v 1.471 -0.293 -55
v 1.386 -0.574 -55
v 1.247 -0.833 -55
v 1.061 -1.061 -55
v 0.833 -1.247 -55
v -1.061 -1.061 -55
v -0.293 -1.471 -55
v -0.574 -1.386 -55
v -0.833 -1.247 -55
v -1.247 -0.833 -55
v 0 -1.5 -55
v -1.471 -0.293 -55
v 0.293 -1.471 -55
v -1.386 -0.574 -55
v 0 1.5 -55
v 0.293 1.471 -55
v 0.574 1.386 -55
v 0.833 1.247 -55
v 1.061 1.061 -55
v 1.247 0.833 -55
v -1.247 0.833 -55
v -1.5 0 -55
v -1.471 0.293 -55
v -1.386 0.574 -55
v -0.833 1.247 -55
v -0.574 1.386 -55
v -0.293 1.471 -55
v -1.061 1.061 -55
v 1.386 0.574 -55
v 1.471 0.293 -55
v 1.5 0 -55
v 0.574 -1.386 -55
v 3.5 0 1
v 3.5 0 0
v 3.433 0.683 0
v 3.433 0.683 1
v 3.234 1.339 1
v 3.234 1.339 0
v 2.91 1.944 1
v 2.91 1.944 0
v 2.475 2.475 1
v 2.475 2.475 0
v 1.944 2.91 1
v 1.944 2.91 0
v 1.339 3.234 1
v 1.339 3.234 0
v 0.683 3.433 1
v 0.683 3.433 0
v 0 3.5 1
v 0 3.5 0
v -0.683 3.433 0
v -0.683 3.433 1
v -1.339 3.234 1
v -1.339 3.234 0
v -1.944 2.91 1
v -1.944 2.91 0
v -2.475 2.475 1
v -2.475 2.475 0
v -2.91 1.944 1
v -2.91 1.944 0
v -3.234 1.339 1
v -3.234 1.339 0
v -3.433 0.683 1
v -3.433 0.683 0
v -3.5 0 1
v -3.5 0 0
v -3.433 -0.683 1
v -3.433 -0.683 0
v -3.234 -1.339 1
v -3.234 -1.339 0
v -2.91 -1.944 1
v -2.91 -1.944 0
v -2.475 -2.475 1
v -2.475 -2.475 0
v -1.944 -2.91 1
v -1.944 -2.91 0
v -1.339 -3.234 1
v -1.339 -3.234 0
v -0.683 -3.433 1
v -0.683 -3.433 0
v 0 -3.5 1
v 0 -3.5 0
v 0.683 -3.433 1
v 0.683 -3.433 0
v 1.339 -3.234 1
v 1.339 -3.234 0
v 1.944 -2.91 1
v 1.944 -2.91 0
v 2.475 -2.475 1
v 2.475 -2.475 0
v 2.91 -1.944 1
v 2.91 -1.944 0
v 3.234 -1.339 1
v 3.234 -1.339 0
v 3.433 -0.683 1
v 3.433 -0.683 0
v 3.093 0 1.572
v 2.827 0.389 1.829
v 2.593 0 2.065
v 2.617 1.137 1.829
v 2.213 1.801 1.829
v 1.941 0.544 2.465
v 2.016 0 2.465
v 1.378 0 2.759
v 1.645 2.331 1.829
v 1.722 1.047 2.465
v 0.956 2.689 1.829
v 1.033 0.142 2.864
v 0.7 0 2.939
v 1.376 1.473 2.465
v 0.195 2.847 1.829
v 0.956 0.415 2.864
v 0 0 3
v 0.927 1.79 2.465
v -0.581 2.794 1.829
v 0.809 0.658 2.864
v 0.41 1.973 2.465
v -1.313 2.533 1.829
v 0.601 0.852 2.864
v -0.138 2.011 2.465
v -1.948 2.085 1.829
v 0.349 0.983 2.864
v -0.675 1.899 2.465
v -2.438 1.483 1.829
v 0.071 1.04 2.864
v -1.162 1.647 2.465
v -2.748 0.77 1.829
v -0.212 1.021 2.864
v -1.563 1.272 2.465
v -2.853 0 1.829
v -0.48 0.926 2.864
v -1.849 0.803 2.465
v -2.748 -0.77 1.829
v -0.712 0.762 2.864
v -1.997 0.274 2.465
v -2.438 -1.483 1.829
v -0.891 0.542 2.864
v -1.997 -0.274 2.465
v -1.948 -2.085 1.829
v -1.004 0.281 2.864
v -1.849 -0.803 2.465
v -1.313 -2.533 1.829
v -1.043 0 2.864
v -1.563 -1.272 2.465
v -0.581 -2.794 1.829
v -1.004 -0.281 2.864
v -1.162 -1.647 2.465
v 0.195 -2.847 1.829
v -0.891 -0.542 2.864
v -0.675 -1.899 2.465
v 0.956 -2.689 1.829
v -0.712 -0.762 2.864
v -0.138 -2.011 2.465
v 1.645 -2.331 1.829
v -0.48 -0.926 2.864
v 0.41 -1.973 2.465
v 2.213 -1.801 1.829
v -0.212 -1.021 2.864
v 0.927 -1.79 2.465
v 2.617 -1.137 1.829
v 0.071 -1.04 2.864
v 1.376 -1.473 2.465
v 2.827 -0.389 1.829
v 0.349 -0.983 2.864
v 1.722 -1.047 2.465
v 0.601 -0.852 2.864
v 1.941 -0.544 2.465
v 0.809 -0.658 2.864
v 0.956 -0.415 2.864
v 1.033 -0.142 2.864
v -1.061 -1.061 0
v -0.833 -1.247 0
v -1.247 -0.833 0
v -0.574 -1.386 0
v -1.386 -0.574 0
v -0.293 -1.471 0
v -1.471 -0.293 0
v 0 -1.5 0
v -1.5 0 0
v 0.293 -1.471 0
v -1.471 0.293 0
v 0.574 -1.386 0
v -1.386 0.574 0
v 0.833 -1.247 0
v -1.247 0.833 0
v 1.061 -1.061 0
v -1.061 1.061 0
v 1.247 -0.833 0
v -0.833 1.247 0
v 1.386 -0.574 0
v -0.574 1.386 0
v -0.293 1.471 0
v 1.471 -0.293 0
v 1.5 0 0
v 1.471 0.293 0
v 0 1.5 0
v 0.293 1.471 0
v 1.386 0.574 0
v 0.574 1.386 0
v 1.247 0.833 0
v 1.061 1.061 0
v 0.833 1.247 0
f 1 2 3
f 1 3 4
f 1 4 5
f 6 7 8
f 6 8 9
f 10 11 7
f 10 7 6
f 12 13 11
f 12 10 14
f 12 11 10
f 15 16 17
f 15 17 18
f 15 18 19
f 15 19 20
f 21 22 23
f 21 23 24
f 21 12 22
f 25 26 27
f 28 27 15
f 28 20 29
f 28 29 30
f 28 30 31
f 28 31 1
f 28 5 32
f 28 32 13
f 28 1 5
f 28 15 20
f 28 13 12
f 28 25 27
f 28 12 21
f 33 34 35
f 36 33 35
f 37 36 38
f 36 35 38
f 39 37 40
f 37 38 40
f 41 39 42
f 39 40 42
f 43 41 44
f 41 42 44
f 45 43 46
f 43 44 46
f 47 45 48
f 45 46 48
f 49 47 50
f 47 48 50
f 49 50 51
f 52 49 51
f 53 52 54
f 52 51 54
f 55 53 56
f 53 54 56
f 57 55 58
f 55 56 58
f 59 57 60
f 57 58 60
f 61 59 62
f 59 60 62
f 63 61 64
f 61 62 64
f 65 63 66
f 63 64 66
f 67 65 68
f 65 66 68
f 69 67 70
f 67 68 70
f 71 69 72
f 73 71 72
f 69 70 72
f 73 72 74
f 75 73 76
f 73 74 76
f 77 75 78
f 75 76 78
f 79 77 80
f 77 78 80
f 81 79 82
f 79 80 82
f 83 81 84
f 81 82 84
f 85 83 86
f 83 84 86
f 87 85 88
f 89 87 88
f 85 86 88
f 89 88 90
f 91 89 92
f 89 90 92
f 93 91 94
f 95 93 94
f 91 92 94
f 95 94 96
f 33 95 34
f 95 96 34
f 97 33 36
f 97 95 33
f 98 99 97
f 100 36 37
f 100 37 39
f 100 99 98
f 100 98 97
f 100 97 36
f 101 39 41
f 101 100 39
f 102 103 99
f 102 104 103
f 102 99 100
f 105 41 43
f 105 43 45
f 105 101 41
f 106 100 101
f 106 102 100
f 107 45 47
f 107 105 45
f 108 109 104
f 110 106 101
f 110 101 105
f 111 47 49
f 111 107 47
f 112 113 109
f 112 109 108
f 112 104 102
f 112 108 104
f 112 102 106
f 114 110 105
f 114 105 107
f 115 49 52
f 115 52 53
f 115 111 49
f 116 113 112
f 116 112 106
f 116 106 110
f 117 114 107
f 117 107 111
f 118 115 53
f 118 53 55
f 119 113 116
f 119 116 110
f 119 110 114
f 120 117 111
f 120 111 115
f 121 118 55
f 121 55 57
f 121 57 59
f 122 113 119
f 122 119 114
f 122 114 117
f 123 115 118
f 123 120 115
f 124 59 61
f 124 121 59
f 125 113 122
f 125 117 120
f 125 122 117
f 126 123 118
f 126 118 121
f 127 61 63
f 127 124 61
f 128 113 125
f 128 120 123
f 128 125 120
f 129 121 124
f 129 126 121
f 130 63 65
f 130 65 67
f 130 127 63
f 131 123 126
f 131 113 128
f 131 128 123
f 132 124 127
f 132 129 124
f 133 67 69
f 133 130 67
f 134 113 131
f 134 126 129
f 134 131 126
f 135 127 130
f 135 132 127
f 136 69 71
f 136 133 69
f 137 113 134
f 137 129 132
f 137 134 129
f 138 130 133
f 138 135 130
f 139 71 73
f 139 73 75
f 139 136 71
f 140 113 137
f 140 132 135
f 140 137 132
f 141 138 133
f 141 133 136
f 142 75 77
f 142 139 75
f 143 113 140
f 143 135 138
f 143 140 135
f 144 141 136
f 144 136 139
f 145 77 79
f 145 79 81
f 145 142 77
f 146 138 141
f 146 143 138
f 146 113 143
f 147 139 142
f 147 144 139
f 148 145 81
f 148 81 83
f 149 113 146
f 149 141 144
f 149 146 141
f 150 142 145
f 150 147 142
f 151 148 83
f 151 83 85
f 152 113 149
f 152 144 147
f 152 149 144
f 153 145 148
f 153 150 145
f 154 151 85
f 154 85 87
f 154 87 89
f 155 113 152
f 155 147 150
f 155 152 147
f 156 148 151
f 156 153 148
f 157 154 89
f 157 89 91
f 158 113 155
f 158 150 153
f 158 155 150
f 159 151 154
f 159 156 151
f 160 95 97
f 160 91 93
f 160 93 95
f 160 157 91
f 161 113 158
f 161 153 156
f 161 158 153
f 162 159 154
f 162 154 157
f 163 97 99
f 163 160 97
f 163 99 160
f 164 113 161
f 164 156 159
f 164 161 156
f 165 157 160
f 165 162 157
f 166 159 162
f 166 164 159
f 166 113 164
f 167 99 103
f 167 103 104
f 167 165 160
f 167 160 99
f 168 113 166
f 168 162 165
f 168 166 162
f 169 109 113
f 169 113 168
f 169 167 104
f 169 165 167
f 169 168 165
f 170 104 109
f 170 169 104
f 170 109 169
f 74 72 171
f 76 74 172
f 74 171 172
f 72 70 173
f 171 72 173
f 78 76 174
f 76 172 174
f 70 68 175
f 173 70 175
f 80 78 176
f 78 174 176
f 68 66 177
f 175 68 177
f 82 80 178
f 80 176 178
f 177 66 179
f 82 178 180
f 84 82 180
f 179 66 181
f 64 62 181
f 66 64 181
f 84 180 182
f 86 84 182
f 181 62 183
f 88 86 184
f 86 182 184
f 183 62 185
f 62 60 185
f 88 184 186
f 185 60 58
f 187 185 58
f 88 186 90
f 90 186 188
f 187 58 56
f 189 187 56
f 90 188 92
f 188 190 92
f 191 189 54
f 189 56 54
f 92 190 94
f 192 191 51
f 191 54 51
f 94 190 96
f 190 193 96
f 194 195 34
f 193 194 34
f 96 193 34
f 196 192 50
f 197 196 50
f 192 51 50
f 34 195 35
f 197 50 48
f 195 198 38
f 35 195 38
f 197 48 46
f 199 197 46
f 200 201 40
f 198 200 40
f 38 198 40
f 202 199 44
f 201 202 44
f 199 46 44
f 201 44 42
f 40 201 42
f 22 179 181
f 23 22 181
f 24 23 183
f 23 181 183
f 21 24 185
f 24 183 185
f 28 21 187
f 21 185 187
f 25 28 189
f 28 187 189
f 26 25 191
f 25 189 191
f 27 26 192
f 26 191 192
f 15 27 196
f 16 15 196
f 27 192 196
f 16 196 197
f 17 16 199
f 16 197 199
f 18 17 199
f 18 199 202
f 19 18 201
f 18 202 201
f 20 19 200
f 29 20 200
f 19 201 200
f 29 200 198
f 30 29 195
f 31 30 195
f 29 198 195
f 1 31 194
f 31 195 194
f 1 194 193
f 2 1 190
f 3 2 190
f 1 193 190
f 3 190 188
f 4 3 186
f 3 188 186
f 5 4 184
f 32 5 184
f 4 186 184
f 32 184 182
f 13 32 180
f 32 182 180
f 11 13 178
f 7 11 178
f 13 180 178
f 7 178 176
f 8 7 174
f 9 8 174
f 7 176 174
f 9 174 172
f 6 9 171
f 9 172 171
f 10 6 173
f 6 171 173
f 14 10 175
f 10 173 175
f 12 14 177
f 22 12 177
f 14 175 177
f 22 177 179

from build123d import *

# Parameters (mm, degrees)
SKETCH1_R           = 3.5
BOSS_EXTRUDE1_DEPTH = 1
DOME1_FACE_RADIUS   = 3.5
DOME1_HEIGHT        = 2
SKETCH3_R           = 1.5
BOSS_EXTRUDE2_DEPTH = 55


with BuildPart() as part:
    # Sketch1 → Boss-Extrude1 (new body)
    with BuildSketch(Plane.XY):
        Circle(SKETCH1_R)
    extrude(amount=BOSS_EXTRUDE1_DEPTH)

    # Dome1: a dome of height H over a round flat face of radius A is a cap of a sphere of radius (A * A + H * H) / (2 * H)
    dome1_r = (DOME1_FACE_RADIUS * DOME1_FACE_RADIUS + DOME1_HEIGHT * DOME1_HEIGHT) / (2 * DOME1_HEIGHT)
    dome1_base = Plane((0, 0, 1), z_dir=(0, 0, 1))
    with Locations(dome1_base.offset(DOME1_HEIGHT - dome1_r)):
        dome1_ball = Sphere(dome1_r, mode=Mode.PRIVATE)
    add(split(dome1_ball, bisect_by=dome1_base, keep=Keep.TOP, mode=Mode.PRIVATE))

    # Sketch3 → Boss-Extrude2 (add)
    with BuildSketch(Plane(origin=(0, 0, 0), x_dir=(-1, 0, 0), z_dir=(0, 0, -1))):
        Circle(SKETCH3_R)
    extrude(amount=BOSS_EXTRUDE2_DEPTH)


solid = part.part
